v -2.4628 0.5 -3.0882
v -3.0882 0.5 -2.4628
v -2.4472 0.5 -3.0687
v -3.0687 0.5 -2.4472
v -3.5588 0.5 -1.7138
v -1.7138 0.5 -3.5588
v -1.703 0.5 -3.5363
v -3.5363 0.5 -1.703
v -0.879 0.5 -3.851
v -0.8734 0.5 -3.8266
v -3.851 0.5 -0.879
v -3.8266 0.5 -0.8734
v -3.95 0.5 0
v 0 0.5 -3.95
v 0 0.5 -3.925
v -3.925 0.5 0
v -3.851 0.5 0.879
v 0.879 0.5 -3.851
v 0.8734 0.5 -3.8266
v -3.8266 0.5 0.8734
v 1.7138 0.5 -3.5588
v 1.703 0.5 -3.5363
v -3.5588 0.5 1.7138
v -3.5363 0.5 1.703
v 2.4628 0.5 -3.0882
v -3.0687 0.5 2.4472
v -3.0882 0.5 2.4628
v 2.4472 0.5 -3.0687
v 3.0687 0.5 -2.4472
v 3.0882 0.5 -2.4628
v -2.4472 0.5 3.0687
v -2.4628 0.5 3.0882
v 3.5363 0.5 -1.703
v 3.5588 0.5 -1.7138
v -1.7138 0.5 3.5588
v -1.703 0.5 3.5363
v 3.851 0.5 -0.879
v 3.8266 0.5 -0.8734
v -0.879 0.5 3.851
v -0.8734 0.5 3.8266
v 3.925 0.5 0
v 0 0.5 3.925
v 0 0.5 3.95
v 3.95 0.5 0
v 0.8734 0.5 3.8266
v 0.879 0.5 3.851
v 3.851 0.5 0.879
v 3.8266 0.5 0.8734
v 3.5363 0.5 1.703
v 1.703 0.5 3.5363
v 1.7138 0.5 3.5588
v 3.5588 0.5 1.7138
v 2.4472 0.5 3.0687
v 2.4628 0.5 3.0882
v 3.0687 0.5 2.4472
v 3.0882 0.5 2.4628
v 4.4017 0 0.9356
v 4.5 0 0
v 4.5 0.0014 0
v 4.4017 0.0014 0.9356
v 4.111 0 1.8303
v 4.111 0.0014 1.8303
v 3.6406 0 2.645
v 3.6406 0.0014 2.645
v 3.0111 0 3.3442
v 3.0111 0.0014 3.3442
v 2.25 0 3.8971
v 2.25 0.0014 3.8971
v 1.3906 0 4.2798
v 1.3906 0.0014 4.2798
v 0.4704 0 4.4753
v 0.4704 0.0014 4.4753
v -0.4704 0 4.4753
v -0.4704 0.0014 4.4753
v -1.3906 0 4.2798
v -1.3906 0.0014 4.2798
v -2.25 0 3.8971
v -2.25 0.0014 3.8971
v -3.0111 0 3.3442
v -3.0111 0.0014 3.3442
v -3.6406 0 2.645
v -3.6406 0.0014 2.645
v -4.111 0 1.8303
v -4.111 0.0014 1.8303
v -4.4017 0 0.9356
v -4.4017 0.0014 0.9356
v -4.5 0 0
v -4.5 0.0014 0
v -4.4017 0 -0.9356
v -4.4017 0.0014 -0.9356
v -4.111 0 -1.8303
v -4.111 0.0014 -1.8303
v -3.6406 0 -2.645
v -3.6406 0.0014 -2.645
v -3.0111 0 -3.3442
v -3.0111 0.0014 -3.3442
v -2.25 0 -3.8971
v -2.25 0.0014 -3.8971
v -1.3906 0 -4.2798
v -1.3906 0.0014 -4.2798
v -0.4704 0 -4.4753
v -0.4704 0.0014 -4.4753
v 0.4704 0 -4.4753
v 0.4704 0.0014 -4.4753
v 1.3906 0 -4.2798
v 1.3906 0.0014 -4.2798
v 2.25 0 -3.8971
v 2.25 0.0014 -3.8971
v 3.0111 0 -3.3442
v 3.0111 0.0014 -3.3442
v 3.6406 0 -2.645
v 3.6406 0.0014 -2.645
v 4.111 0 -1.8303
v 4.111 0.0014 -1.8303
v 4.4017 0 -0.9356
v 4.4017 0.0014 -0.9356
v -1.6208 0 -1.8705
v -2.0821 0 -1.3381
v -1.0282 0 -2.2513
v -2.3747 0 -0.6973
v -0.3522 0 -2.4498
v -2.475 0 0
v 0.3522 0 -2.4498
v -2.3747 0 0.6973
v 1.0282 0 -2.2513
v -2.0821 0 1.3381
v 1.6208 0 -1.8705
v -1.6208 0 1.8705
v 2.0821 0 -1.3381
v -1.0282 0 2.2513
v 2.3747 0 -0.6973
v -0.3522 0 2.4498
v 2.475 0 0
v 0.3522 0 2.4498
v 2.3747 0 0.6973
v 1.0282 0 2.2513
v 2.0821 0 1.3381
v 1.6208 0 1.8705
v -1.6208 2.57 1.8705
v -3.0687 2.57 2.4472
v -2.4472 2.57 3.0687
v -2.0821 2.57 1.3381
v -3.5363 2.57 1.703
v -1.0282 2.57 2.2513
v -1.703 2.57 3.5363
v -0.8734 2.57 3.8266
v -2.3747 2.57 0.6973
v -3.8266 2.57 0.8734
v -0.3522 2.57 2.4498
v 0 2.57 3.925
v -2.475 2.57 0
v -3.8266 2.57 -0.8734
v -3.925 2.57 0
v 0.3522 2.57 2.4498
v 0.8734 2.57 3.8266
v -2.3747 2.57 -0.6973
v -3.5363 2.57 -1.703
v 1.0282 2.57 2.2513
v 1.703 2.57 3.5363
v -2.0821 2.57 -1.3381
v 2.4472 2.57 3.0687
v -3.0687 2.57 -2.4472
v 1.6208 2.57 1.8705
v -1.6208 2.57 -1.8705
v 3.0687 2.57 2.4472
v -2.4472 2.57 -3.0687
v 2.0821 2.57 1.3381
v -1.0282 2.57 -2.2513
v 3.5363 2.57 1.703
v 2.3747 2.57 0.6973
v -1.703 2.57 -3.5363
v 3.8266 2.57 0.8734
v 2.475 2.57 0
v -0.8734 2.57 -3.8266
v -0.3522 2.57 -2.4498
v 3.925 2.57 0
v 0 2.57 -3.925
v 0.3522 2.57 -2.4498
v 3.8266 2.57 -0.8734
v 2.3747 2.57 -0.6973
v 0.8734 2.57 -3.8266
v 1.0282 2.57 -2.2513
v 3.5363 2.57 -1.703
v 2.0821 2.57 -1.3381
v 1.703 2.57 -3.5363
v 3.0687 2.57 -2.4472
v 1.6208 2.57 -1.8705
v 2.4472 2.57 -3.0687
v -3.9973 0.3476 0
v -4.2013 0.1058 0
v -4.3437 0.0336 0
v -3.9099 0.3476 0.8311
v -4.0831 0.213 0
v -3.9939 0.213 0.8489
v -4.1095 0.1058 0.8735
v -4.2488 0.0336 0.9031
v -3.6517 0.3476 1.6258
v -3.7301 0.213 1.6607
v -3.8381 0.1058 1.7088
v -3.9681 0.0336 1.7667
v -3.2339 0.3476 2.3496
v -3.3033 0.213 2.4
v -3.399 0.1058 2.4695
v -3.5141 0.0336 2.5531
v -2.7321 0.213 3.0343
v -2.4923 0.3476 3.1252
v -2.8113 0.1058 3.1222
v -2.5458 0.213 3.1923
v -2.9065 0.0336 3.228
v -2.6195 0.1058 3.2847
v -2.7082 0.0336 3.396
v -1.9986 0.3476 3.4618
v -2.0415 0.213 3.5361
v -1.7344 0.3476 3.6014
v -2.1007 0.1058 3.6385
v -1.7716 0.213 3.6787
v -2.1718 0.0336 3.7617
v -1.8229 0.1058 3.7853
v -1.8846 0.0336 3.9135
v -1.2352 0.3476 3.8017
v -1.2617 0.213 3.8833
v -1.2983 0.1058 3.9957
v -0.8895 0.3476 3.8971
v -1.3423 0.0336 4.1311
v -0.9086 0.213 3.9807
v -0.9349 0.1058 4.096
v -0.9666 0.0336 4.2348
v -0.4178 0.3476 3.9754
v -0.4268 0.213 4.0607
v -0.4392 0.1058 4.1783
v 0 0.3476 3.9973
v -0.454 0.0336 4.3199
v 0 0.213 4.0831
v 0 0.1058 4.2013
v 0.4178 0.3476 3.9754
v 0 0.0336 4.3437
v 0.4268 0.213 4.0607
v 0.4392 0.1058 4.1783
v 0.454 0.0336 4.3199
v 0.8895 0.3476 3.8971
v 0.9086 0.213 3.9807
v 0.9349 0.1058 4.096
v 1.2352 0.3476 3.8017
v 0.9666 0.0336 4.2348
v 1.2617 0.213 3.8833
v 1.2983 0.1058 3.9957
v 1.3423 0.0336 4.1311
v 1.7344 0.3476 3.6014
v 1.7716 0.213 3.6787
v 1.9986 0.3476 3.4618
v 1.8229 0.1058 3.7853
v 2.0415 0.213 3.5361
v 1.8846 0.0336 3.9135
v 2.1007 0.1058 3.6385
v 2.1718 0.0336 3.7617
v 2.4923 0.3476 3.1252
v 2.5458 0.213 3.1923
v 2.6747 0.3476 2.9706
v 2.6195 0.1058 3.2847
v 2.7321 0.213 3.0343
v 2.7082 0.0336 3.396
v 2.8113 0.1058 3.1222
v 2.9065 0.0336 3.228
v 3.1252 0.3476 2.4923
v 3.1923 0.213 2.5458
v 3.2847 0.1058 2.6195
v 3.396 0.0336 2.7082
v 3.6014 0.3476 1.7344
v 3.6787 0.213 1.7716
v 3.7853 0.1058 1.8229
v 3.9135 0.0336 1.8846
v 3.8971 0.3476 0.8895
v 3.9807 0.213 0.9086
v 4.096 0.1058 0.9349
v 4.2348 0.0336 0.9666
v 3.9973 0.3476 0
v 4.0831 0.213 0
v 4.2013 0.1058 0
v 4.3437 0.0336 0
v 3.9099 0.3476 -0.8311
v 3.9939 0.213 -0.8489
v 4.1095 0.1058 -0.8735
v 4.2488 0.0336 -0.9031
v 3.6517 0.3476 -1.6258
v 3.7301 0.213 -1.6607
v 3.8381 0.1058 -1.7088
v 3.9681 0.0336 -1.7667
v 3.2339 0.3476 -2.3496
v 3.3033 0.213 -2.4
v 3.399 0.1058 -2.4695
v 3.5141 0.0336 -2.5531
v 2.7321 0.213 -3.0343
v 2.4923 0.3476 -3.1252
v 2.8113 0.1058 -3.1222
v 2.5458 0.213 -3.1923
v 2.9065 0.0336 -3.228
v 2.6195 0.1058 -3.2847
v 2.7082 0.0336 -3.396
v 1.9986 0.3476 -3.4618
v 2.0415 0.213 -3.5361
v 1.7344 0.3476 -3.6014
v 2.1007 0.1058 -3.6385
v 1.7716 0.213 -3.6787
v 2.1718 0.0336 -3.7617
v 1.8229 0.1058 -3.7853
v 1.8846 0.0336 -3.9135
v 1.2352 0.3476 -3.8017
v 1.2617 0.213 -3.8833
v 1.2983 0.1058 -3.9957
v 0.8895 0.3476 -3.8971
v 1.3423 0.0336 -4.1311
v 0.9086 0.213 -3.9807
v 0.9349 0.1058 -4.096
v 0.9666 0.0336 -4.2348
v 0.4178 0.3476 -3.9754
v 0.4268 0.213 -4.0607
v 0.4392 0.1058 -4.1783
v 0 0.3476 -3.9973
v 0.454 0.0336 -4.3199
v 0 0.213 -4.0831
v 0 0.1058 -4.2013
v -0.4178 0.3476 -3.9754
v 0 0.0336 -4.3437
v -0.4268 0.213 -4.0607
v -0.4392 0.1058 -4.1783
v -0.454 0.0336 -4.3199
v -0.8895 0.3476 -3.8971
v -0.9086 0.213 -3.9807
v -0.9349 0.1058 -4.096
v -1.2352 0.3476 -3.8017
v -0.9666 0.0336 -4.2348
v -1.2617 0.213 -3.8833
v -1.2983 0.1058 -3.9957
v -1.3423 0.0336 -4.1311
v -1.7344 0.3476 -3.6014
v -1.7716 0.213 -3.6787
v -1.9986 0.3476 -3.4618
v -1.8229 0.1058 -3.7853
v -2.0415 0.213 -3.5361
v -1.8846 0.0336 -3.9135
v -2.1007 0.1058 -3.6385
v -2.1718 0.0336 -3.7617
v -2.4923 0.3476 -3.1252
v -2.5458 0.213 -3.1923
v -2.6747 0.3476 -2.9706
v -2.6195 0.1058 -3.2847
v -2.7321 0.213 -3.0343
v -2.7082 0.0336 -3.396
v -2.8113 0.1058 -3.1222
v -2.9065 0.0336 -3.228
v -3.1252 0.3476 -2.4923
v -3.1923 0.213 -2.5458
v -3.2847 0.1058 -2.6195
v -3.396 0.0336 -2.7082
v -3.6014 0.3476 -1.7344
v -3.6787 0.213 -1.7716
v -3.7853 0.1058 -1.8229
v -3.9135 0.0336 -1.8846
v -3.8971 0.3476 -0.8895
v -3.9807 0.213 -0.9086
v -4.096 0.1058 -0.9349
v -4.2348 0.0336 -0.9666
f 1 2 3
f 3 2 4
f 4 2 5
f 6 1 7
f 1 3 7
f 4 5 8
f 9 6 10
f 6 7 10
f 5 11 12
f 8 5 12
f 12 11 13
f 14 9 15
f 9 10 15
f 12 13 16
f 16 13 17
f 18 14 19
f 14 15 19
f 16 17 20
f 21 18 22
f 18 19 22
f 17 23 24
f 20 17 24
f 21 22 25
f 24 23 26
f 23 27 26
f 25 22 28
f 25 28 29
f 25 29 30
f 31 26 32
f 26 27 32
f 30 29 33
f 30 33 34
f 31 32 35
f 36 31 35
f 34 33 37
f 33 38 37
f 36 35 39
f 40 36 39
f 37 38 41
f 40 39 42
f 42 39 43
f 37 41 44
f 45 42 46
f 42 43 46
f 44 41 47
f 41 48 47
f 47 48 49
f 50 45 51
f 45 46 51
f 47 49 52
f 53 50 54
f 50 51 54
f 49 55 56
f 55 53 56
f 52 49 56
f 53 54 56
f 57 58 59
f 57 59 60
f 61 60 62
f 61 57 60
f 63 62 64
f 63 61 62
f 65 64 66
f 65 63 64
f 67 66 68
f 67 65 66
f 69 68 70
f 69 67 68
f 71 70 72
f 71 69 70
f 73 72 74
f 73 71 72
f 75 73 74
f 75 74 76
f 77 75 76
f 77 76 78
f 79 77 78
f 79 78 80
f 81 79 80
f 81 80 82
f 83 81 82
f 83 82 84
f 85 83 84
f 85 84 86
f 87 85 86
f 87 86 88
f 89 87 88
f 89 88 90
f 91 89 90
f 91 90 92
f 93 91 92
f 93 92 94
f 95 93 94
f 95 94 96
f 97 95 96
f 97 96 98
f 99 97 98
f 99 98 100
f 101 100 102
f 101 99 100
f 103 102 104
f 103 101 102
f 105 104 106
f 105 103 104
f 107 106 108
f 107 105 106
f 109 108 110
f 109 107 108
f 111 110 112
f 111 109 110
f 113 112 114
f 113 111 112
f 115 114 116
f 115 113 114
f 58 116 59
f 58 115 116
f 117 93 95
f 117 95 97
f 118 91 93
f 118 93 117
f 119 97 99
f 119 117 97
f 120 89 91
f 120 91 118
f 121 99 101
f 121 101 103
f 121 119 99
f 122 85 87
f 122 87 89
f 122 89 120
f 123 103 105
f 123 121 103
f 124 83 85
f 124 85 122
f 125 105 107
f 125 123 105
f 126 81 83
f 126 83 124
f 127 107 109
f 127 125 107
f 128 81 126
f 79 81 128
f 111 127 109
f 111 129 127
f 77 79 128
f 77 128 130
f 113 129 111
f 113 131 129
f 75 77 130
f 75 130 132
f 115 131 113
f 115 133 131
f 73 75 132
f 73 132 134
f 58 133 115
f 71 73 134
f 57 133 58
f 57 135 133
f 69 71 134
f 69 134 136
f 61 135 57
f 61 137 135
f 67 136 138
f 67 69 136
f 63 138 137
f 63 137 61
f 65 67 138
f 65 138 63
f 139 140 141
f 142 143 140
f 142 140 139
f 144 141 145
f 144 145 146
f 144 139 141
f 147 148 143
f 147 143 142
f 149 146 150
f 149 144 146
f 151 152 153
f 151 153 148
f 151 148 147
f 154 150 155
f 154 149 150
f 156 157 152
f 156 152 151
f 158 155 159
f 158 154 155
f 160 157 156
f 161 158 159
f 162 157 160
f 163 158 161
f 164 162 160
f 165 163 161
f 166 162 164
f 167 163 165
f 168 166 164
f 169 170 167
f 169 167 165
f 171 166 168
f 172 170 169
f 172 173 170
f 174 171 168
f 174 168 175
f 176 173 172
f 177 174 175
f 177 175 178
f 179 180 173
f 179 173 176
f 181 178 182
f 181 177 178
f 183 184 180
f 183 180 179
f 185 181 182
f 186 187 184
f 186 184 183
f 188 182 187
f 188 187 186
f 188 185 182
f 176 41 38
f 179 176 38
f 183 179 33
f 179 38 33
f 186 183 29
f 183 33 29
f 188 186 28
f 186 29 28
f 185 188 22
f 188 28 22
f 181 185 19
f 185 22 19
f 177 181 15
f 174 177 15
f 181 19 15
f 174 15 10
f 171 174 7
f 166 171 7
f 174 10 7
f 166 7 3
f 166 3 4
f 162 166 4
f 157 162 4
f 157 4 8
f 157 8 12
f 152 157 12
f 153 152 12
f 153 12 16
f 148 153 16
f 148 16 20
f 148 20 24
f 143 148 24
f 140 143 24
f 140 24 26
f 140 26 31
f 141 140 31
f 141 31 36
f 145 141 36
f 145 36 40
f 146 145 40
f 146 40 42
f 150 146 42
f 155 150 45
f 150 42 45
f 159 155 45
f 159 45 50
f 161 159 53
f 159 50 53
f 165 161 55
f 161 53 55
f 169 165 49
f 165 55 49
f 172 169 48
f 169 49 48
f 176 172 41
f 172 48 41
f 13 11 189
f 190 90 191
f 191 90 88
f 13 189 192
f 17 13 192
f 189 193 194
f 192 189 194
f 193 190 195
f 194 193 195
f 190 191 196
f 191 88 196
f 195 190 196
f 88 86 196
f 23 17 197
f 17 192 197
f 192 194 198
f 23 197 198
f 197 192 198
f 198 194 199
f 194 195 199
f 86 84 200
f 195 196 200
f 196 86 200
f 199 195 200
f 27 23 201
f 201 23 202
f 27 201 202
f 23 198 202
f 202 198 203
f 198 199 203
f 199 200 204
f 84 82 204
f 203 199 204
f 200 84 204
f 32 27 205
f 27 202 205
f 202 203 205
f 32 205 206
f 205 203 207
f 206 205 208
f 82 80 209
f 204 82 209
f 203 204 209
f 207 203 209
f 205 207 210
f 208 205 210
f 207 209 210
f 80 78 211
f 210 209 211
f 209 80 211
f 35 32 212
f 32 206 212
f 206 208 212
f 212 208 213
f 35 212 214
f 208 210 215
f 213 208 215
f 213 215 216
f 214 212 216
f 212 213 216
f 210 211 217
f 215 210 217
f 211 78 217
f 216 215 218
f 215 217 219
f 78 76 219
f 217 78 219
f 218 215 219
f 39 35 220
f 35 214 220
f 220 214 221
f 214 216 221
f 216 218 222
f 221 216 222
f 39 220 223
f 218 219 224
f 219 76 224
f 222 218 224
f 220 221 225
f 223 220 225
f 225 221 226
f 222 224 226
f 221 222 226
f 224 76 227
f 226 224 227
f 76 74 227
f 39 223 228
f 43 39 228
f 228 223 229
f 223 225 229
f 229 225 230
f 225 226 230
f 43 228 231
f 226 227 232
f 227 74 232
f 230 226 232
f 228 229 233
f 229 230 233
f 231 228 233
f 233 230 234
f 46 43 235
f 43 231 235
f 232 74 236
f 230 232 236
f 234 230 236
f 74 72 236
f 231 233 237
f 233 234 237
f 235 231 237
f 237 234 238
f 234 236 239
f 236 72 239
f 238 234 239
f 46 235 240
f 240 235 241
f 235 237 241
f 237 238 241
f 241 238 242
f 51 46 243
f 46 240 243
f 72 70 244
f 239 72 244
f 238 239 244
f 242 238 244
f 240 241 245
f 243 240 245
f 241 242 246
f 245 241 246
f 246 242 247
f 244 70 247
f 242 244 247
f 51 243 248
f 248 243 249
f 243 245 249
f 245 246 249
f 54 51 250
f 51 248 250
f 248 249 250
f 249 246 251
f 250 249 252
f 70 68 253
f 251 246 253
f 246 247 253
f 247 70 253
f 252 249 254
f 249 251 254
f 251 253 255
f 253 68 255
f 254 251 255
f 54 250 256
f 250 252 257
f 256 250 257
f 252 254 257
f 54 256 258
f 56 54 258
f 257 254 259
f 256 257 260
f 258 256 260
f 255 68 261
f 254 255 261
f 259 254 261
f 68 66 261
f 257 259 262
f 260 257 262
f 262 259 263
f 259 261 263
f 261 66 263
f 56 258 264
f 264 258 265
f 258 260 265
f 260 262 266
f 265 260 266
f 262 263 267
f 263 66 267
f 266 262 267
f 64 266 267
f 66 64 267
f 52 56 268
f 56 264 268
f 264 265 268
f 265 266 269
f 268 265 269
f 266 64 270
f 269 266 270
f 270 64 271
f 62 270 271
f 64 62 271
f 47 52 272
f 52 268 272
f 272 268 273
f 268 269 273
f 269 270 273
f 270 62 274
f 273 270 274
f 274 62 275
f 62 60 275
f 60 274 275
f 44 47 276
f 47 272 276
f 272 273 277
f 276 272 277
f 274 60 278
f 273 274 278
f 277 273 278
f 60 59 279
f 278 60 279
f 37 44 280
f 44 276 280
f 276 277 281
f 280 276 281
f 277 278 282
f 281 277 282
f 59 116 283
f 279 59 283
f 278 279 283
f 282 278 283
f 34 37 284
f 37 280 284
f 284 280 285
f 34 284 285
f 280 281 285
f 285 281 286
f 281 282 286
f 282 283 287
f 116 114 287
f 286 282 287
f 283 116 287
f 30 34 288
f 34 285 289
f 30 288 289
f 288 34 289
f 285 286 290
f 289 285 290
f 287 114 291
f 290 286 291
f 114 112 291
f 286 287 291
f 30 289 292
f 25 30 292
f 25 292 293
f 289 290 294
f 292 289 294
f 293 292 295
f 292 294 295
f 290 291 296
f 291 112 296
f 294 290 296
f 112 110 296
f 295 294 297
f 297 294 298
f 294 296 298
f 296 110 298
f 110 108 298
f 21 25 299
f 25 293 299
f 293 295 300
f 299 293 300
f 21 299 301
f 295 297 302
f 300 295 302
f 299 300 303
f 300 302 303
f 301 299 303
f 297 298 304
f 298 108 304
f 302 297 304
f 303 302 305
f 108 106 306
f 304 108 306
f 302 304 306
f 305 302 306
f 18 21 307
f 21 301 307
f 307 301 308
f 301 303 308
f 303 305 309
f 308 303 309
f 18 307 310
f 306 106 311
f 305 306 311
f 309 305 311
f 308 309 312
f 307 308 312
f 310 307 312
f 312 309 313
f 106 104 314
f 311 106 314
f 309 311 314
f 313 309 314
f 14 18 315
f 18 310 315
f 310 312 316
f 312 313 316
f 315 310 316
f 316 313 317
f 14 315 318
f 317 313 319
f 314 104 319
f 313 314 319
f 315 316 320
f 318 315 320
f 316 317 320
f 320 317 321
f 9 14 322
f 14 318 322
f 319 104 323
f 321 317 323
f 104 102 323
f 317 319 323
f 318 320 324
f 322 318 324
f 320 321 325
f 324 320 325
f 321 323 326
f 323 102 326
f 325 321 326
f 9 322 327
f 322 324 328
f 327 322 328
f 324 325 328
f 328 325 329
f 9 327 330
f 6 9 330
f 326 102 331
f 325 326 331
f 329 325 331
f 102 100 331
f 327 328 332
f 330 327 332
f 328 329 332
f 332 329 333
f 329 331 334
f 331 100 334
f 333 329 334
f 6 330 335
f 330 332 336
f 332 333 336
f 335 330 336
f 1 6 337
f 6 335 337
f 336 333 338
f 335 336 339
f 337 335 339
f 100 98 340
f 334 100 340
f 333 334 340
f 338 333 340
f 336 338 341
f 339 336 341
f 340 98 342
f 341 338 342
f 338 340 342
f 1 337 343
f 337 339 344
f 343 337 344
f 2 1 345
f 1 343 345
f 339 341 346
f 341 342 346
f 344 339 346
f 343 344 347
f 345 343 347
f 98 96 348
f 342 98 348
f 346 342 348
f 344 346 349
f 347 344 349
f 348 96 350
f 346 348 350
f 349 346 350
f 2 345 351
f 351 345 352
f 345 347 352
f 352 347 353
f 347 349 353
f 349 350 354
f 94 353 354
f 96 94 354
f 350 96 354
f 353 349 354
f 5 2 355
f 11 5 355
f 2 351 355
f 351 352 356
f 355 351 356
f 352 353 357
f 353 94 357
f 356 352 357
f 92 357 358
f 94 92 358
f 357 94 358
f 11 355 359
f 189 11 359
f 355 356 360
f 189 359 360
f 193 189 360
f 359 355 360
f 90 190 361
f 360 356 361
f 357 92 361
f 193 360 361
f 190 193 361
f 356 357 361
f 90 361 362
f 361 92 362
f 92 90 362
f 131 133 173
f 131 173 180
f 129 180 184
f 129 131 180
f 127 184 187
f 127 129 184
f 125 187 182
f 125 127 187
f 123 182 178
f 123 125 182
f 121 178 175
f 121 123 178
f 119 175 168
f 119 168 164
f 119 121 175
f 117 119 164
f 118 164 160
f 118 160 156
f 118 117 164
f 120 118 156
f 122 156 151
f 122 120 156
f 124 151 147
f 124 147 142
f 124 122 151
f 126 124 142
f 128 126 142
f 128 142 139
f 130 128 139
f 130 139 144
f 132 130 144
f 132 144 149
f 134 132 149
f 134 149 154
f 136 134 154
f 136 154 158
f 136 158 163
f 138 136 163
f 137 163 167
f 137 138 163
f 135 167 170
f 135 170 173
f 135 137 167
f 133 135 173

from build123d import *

# Parameters (mm, degrees)
SKETCH_1_R      = 3.925
SKETCH_1_R_2    = 2.475
EXTRUDE_1_DEPTH = 2.57
SKETCH_2_R      = 4.5
SKETCH_2_R_2    = 3.925
EXTRUDE_2_DEPTH = 0.5


with BuildPart() as part:
    # Эскиз1 → Бобышка-Вытянуть1 (new body)
    with BuildSketch(Plane(origin=(0, 0, 0), x_dir=(1, 0, 0), z_dir=(0, 1, 0))):
        Circle(SKETCH_1_R)
        Circle(SKETCH_1_R_2, mode=Mode.SUBTRACT)
    extrude(amount=EXTRUDE_1_DEPTH)

    # Эскиз2 → Бобышка-Вытянуть2 (add)
    with BuildSketch(Plane.XZ):
        Circle(SKETCH_2_R)
        Circle(SKETCH_2_R_2, mode=Mode.SUBTRACT)
    extrude(amount=-EXTRUDE_2_DEPTH)

    # Эскиз3 → Вырез-Повернуть1 (revolve, cut)
    with BuildSketch(Plane.XY):
        with BuildLine():
            Line((-4.5, 0.001444425), (-4.5, 0.5))
            Line((-4.5, 0.5), (-3.95, 0.5))
            ThreePointArc((-3.95, 0.5), (-4.138643926, 0.15545532), (-4.5, 0.001444425))
        make_face()
    revolve(axis=Axis((0, 0, 0), (0, 1, 0)), mode=Mode.SUBTRACT)


solid = part.part
